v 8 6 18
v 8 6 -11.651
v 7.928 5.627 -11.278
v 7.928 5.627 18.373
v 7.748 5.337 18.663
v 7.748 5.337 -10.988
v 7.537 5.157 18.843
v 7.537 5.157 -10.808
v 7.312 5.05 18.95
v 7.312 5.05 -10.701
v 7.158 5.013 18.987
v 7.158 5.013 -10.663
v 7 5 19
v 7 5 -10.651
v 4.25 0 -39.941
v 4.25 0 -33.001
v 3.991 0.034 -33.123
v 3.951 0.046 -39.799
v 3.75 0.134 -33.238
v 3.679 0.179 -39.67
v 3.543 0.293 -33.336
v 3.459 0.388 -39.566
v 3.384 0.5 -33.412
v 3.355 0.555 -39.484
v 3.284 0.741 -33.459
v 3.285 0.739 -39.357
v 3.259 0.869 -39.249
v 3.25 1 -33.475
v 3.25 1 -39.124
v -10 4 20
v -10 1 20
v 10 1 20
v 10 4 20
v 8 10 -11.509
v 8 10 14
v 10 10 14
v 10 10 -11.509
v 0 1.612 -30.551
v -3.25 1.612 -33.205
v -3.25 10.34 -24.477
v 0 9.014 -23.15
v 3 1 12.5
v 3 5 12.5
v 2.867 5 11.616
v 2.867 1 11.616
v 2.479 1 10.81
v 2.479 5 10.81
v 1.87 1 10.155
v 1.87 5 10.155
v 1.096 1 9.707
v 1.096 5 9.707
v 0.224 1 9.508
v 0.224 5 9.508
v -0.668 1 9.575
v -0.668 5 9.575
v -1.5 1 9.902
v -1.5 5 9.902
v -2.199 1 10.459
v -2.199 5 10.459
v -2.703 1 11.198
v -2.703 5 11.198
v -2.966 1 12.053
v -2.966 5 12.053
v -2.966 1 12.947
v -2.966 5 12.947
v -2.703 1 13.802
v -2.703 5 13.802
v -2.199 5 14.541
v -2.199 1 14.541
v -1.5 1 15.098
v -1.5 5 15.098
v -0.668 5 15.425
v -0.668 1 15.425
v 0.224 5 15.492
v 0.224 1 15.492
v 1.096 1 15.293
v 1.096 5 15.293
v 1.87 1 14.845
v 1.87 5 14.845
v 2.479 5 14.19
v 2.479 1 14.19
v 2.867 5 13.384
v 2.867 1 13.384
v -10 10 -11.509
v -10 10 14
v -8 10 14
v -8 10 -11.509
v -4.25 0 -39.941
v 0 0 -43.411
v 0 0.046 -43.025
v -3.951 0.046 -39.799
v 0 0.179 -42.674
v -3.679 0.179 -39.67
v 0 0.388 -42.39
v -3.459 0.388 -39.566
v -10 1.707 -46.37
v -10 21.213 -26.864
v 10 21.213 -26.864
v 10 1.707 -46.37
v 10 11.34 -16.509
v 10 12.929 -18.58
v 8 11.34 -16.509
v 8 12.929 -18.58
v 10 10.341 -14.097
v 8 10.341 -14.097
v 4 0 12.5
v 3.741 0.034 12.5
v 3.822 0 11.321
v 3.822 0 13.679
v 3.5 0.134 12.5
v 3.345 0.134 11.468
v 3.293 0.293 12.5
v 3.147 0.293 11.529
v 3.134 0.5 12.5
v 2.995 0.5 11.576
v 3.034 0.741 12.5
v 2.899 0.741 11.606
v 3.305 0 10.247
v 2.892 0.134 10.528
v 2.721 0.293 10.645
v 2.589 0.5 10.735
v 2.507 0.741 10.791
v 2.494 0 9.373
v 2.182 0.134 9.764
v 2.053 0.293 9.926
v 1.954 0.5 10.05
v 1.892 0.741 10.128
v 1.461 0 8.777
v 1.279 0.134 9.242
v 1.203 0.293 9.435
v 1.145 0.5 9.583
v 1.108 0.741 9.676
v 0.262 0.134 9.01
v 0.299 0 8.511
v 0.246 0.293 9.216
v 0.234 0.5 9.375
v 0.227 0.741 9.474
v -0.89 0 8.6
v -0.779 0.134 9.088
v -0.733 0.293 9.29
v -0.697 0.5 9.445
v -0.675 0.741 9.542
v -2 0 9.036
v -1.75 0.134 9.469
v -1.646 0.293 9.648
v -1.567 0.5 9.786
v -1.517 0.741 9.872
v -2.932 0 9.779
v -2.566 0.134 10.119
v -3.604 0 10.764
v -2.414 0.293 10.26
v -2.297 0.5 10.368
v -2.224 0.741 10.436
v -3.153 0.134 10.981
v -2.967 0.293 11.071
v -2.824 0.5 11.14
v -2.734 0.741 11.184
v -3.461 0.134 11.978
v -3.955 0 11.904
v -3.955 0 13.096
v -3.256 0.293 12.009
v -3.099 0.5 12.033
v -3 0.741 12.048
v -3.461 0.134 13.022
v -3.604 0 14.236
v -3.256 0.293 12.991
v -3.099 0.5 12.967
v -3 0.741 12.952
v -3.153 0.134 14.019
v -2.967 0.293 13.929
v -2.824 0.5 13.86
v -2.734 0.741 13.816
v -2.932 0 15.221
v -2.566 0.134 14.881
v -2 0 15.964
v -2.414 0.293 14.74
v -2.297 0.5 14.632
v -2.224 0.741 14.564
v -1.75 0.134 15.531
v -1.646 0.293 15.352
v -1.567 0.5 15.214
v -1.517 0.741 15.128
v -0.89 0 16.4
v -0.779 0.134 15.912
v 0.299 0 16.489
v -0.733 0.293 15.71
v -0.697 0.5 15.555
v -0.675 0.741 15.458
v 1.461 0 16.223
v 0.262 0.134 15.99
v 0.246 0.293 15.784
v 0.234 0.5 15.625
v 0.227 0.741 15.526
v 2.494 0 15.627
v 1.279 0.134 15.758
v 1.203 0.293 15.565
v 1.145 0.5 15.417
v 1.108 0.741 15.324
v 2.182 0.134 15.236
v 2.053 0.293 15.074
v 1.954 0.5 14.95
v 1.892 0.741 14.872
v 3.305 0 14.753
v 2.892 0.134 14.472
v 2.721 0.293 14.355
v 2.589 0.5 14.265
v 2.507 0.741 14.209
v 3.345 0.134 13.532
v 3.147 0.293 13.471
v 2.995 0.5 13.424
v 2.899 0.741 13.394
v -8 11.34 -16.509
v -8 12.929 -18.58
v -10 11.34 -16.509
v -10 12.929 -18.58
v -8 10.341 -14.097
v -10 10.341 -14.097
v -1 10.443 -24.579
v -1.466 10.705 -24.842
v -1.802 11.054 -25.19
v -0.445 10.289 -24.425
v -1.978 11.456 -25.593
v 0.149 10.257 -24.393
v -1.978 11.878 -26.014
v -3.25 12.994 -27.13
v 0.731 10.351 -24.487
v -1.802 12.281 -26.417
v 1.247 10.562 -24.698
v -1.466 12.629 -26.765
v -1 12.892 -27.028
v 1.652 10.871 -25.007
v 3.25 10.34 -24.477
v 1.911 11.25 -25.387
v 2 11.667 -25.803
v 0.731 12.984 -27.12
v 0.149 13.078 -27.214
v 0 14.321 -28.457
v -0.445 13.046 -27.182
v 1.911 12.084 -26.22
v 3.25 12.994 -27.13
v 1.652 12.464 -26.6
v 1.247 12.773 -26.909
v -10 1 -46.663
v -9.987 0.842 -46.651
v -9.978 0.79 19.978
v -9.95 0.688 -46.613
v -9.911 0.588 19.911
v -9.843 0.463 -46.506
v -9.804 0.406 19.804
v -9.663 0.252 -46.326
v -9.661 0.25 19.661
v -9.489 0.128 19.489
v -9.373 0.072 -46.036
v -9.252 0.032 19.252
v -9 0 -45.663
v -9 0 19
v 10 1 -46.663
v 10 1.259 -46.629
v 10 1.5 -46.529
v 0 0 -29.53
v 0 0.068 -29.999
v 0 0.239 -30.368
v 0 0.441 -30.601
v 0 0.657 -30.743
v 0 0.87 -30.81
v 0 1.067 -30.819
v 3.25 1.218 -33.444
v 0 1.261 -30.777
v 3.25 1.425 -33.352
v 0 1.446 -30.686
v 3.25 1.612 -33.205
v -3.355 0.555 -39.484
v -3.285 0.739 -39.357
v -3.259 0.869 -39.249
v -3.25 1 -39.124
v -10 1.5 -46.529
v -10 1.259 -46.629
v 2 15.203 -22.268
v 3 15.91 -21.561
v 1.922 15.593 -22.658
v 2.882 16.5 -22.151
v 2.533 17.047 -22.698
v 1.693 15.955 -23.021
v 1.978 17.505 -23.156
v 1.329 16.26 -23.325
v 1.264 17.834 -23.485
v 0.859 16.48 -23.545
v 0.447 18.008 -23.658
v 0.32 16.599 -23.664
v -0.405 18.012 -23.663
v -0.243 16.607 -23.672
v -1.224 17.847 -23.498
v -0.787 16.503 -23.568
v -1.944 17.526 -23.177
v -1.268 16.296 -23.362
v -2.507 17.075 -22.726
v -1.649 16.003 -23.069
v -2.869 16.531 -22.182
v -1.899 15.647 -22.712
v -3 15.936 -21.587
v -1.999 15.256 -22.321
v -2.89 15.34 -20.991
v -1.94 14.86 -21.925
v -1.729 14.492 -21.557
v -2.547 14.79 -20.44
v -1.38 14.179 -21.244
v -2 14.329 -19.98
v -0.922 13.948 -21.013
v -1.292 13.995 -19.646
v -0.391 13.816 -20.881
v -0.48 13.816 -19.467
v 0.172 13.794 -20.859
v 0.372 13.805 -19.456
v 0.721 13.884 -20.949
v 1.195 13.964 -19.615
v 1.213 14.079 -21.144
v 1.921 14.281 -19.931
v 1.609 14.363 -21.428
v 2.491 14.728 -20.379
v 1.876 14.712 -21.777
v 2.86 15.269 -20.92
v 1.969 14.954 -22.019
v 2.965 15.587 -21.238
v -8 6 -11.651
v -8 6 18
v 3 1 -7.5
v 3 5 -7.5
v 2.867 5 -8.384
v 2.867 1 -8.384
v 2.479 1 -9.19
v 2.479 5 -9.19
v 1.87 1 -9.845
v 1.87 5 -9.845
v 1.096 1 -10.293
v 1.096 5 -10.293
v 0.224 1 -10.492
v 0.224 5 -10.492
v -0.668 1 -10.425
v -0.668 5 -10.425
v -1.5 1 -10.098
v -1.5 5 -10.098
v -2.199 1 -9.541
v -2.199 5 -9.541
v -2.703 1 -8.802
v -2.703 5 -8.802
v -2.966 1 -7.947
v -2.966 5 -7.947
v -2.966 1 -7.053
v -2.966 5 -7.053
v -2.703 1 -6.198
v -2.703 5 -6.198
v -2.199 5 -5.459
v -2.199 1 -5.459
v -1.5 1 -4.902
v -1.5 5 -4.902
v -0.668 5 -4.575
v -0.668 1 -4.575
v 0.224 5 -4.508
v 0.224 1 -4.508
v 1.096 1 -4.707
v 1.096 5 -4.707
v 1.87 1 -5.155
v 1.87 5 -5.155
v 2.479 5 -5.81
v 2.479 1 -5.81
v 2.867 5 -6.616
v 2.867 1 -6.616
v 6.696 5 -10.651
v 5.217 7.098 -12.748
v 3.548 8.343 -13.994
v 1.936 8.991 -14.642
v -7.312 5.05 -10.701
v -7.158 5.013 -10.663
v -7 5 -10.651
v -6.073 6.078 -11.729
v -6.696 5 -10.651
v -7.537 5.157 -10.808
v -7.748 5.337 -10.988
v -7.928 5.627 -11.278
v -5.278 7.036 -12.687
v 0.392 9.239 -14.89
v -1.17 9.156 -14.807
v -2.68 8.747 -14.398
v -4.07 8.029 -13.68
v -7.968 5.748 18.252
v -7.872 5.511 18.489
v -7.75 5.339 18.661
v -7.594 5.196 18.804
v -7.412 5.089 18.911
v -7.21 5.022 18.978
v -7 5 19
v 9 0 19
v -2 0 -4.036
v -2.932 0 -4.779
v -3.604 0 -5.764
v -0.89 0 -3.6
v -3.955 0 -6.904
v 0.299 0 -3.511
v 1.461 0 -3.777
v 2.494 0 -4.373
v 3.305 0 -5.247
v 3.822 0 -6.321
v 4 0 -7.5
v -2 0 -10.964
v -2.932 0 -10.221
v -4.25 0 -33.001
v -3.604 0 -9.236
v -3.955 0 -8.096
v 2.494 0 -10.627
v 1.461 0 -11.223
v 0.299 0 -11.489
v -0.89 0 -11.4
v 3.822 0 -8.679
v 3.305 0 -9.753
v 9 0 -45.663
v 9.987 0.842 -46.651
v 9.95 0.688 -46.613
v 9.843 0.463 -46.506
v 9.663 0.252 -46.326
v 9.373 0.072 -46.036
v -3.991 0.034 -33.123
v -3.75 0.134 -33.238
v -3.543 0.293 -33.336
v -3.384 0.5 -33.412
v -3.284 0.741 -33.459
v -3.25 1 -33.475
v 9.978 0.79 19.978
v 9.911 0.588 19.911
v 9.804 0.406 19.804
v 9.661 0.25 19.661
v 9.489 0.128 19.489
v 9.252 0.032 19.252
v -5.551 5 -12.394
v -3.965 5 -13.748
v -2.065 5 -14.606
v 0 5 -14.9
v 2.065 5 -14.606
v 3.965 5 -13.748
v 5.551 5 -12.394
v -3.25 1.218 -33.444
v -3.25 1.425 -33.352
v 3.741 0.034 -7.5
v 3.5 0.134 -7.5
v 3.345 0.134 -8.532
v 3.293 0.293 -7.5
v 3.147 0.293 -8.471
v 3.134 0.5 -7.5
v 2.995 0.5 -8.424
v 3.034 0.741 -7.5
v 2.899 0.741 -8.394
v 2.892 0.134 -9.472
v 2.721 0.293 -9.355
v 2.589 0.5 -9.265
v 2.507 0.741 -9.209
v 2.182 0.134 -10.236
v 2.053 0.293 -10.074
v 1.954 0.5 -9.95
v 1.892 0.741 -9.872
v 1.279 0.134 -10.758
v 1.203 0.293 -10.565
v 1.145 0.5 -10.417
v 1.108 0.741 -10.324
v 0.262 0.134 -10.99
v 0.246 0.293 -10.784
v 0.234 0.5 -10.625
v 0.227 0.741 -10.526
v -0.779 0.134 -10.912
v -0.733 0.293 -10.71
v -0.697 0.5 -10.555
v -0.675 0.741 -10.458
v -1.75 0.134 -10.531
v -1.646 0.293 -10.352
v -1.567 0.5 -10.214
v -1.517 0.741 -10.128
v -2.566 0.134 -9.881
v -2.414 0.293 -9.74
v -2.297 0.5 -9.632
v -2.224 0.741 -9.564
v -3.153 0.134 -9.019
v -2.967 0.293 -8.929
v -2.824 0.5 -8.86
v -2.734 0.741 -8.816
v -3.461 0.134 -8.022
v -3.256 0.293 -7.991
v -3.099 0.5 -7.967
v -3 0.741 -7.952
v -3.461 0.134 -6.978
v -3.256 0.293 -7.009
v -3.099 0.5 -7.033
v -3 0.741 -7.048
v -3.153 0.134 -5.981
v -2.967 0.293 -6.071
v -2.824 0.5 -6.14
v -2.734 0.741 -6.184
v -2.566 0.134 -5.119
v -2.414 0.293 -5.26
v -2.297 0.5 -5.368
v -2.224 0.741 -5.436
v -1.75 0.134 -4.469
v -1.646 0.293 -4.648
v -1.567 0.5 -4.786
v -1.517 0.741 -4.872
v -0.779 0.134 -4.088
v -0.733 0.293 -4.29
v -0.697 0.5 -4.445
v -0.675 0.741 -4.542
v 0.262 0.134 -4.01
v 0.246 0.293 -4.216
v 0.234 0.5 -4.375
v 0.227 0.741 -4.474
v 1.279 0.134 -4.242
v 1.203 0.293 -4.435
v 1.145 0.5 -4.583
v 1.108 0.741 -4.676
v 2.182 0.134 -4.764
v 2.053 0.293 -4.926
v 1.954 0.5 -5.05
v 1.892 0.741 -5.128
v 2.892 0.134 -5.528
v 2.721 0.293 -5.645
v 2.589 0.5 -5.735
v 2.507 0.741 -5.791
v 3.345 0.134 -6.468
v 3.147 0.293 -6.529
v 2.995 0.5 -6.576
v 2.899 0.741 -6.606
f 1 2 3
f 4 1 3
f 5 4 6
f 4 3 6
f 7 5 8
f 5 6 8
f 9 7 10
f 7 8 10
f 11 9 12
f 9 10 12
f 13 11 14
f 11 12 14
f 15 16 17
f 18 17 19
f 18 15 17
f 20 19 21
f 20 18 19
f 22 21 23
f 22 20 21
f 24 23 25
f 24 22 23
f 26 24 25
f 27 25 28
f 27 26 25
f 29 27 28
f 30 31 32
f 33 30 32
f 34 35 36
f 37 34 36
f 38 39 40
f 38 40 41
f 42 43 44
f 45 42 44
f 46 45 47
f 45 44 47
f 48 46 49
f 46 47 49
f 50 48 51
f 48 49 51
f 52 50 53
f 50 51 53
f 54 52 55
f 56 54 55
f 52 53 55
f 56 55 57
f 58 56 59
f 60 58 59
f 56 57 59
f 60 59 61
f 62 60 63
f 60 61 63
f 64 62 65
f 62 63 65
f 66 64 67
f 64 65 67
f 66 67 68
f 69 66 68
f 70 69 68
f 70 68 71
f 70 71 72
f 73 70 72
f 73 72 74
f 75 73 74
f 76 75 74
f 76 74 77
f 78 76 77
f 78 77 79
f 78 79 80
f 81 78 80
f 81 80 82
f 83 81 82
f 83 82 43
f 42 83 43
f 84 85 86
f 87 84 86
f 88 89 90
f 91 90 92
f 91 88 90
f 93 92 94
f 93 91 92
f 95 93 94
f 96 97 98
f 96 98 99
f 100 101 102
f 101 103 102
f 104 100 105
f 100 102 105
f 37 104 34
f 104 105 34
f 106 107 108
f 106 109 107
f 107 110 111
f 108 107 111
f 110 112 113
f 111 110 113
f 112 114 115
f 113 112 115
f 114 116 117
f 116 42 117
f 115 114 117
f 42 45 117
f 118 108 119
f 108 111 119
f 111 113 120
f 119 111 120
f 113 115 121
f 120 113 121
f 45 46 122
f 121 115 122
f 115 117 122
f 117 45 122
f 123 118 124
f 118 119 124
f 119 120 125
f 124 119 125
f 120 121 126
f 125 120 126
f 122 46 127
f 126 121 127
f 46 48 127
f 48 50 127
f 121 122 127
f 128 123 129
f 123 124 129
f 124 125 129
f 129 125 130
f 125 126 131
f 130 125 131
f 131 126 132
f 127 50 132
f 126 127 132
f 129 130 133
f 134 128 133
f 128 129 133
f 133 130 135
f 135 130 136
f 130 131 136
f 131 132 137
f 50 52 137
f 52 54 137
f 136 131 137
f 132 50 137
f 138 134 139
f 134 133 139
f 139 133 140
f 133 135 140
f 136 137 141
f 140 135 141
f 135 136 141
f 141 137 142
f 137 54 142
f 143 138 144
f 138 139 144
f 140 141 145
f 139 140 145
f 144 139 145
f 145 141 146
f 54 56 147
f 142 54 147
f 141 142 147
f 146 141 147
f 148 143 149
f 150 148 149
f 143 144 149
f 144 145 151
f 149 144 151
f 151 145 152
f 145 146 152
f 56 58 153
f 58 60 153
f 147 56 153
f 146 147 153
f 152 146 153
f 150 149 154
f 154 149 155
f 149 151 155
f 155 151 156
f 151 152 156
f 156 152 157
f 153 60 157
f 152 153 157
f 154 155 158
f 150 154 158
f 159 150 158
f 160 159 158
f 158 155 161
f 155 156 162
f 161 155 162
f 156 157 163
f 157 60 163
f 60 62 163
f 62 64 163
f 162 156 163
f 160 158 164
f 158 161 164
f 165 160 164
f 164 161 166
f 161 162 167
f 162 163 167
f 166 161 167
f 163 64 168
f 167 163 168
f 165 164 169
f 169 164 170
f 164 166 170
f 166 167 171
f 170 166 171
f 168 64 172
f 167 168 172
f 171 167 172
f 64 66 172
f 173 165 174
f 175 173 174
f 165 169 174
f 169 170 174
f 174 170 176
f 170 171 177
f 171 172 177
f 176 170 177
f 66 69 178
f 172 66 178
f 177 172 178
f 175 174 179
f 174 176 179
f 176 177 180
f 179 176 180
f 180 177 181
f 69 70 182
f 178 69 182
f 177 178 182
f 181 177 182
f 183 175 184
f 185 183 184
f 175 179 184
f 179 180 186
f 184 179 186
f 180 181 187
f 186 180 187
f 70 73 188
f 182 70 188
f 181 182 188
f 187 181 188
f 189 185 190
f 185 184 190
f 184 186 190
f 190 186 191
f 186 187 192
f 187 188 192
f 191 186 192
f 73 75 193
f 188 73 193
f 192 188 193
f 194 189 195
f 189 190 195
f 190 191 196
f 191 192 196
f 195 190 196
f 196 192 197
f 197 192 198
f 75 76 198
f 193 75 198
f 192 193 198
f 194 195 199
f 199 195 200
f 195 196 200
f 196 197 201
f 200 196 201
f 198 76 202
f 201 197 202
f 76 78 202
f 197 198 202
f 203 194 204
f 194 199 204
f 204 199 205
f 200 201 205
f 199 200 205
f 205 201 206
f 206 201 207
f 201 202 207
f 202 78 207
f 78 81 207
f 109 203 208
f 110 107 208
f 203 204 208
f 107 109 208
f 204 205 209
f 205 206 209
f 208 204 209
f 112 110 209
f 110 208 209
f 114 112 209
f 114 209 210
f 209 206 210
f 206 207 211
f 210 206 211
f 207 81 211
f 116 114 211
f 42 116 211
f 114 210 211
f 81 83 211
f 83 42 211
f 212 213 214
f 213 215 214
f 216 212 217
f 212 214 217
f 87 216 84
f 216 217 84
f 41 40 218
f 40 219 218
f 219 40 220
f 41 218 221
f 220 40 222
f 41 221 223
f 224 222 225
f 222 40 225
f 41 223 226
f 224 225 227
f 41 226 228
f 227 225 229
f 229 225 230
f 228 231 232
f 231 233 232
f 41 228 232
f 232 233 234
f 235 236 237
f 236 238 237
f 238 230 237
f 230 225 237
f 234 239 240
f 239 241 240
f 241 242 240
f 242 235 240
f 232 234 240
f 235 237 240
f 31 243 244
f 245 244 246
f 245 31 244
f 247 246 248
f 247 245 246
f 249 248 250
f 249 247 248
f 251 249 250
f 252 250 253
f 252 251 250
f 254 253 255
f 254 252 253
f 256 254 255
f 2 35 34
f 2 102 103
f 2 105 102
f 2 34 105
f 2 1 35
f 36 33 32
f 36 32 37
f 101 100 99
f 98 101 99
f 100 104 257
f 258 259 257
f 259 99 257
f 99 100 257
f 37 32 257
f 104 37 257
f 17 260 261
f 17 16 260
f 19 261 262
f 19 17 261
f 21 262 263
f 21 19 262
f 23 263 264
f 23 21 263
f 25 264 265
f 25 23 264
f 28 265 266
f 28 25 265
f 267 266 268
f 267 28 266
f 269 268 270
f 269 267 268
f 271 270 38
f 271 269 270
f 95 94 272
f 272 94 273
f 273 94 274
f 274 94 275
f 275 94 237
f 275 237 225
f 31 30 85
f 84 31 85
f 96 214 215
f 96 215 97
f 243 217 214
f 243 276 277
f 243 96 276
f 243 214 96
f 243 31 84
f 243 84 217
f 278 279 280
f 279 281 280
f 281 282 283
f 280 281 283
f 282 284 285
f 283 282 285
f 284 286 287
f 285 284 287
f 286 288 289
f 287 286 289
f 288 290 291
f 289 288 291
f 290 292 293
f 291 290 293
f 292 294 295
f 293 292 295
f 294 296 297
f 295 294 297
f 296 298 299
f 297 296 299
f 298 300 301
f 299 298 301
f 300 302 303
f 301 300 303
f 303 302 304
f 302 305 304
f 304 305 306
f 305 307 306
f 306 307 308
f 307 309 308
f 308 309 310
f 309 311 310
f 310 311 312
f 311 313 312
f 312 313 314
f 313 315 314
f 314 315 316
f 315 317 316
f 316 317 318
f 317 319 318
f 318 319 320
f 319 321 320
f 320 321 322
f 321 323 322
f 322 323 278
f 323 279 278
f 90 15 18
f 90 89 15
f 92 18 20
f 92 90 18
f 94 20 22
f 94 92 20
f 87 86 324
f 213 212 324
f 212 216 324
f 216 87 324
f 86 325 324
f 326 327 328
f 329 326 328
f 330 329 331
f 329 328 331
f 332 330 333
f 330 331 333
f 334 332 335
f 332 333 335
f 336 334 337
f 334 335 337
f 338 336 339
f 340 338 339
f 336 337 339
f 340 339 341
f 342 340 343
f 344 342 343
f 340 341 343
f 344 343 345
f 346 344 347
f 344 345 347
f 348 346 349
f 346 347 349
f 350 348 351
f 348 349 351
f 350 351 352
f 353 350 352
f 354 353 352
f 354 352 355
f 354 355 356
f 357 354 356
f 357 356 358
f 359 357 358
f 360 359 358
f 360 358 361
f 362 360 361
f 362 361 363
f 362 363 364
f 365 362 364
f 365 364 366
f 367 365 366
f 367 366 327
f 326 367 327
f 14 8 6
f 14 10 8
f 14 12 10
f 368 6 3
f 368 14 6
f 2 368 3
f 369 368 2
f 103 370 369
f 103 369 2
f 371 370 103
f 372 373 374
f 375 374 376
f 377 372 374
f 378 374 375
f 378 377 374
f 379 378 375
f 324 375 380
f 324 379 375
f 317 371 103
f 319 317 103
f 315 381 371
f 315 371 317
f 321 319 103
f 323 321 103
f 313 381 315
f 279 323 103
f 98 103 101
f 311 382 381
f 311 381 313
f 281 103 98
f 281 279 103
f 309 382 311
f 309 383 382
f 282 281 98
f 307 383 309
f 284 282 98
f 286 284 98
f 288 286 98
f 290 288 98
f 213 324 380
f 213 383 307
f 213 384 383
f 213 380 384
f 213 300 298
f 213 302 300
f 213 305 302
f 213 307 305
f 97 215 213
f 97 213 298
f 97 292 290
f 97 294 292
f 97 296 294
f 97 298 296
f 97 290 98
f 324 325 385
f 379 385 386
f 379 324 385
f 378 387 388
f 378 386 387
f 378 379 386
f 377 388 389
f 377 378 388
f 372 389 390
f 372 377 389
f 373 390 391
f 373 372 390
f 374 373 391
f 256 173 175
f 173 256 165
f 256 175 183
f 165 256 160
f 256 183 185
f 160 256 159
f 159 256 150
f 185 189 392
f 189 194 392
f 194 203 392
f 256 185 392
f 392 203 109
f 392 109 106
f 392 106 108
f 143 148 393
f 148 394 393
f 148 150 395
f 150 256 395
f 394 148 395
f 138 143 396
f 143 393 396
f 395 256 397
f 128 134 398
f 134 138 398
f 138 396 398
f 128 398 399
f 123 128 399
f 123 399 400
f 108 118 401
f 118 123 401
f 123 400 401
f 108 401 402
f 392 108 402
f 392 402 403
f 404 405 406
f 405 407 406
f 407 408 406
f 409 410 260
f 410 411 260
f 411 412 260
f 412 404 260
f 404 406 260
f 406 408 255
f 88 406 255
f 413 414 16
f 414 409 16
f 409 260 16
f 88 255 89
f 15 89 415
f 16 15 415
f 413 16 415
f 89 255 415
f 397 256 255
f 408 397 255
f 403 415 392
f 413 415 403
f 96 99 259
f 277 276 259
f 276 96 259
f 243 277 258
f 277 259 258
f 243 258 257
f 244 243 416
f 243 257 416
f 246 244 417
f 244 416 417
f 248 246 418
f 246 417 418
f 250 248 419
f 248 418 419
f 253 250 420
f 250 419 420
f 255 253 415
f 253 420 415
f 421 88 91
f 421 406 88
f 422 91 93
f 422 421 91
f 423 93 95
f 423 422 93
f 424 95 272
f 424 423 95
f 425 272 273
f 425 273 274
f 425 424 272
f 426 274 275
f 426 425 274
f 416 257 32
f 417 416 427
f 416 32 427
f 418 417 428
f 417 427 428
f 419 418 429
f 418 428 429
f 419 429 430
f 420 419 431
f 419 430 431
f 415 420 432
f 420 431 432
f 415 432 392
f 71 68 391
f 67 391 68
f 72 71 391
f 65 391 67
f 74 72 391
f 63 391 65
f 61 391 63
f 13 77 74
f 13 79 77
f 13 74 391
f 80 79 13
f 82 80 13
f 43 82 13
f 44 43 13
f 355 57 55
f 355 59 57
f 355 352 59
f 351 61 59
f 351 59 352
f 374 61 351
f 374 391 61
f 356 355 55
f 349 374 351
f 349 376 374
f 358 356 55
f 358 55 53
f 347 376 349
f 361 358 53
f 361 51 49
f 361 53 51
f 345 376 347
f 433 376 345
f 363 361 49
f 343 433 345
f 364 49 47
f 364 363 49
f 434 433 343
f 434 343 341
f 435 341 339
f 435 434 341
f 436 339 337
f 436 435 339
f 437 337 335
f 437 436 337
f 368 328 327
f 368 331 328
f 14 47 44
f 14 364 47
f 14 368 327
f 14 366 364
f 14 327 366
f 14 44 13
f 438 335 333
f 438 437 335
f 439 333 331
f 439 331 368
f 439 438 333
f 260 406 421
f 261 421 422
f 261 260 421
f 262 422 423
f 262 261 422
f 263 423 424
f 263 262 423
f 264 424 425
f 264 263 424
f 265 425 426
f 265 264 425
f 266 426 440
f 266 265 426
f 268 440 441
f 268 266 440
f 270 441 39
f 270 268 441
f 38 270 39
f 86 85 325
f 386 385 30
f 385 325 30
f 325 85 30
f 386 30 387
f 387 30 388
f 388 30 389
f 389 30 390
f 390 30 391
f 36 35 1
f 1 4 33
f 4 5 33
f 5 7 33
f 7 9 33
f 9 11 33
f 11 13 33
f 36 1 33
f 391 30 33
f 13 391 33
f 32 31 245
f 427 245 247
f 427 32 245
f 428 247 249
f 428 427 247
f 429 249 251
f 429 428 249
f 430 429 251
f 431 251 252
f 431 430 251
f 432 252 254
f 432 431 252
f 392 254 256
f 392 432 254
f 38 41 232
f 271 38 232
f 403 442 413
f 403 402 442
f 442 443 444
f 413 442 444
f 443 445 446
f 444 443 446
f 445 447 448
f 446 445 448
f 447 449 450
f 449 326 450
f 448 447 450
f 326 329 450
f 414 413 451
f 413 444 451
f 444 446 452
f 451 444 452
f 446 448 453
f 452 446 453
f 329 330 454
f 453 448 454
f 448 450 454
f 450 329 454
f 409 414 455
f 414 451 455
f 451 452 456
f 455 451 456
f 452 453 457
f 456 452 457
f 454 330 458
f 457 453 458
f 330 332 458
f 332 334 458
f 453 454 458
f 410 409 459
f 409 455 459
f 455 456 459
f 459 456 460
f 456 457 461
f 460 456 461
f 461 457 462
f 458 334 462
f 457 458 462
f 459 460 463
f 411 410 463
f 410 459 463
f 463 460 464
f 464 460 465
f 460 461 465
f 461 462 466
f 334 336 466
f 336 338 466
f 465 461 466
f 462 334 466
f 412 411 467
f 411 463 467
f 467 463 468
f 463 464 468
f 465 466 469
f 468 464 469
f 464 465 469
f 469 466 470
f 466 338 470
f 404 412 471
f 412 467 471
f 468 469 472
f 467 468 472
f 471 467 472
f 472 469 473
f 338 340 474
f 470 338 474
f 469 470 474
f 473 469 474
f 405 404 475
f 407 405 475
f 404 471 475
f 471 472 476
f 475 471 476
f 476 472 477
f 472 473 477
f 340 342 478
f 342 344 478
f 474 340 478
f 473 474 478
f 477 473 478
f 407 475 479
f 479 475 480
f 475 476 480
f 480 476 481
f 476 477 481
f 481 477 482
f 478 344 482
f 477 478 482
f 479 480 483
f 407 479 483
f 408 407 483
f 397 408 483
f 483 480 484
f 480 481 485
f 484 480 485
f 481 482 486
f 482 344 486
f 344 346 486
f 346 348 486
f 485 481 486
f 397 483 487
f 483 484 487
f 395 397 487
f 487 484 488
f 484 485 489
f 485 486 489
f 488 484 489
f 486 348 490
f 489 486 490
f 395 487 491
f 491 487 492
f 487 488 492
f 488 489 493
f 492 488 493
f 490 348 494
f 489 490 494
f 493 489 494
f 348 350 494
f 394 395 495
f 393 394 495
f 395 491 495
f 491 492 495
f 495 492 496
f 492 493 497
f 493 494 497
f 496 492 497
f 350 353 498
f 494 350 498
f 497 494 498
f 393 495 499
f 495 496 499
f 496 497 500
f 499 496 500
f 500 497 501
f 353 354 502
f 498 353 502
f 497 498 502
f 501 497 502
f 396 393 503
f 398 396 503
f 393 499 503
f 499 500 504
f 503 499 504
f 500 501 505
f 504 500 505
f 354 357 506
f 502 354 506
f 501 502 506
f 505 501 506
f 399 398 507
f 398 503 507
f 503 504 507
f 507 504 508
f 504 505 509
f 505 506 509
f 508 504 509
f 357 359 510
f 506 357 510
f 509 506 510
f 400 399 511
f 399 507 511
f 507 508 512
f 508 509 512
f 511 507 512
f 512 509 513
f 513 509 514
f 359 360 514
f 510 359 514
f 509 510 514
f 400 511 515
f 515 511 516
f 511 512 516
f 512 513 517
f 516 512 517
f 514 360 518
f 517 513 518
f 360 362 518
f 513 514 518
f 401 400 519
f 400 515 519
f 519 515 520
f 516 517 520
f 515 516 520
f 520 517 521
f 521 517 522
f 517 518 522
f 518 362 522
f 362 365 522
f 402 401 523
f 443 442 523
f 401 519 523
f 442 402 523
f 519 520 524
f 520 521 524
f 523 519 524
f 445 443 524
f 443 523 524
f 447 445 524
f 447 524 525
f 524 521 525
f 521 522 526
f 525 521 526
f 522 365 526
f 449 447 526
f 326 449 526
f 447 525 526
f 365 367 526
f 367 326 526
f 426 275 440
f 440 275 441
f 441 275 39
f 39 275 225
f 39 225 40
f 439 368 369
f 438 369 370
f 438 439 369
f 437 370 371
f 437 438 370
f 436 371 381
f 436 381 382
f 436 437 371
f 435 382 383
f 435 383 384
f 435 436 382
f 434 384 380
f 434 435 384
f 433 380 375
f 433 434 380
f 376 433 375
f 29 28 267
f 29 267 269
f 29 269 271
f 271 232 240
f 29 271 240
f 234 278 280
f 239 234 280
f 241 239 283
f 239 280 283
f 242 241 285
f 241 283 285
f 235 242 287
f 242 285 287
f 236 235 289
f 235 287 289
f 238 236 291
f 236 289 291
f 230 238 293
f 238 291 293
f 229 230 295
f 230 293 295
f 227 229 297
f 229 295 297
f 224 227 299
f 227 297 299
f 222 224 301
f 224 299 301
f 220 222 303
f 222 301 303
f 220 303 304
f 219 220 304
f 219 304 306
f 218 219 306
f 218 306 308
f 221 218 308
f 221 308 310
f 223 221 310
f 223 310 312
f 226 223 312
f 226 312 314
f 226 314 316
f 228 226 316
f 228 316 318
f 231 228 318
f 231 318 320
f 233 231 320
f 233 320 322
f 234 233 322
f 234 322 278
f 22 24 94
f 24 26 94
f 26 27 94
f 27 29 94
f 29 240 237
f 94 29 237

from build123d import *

# Parameters (mm, degrees)
SKETCH1_W           = 20
SKETCH1_H           = 40
BOSS_EXTRUDE1_DEPTH = 5
BOSS_EXTRUDE2_DEPTH = 20
SKETCH3_R           = 3
CUT_EXTRUDE1_DEPTH  = 15
LPATTERN1_COUNT     = 2
LPATTERN1_PITCH     = 20
SKETCH4_R           = 7.4
CUT_EXTRUDE2_DEPTH  = 15
SKETCH5_R           = 2
CUT_EXTRUDE3_DEPTH  = 50
CUT_EXTRUDE4_START  = -6
CUT_EXTRUDE4_DEPTH  = 40
CHAMFER1_SIZE       = 1
FILLET2_R           = 1
SKETCH7_W           = 2
SKETCH7_H           = 45.940909218
BOSS_EXTRUDE3_DEPTH = 5
LPATTERN2_COUNT     = 2
LPATTERN2_PITCH     = 18
FILLET3_R           = 1
CHAMFER2_SIZE       = 6
FILLET4_R           = 10


with BuildPart() as part:
    # Sketch1 → Boss-Extrude1 (new body)
    with BuildSketch(Plane(origin=(0, 0, 0), x_dir=(1, 0, 0), z_dir=(0, 1, 0))):
        Rectangle(SKETCH1_W, SKETCH1_H)
    extrude(amount=BOSS_EXTRUDE1_DEPTH)

    # Sketch2 → Boss-Extrude2 (add)
    with BuildSketch(Plane.ZY.offset(10)):
        Polygon((-5.650883497, 0), (-26.864086932, 21.213203436), (-48.077290368, 0), align=None)
    extrude(amount=-BOSS_EXTRUDE2_DEPTH)

    # Sketch3 → Cut-Extrude1 (cut)
    with BuildSketch(Plane(origin=(0, 5, 0), x_dir=(1, 0, 0), z_dir=(0, 1, 0))):
        with Locations((0, -12.5)):
            Circle(SKETCH3_R)
    cut_extrude1 = extrude(amount=-CUT_EXTRUDE1_DEPTH, mode=Mode.SUBTRACT)

    # LPattern1: Cut-Extrude1 ×2
    with Locations(*[(0, 0, -i * LPATTERN1_PITCH) for i in range(1, LPATTERN1_COUNT)]):
        add(cut_extrude1, mode=Mode.SUBTRACT)

    # Sketch4 → Cut-Extrude2 (cut)
    with BuildSketch(Plane(origin=(0, 5, 0), x_dir=(1, 0, 0), z_dir=(0, 1, 0))):
        with Locations((0, 7.5)):
            Circle(SKETCH4_R)
    extrude(amount=CUT_EXTRUDE2_DEPTH, mode=Mode.SUBTRACT)

    # Sketch5 → Cut-Extrude3 (cut)
    with BuildSketch(Plane(origin=(0, -2.825441748, -2.825441748), x_dir=(1, 0, 0), z_dir=(0, 0.707106781, 0.707106781))):
        with Locations((0, 26.49577804)):
            Circle(SKETCH5_R)
    extrude(amount=-CUT_EXTRUDE3_DEPTH, mode=Mode.SUBTRACT)

    # Sketch6 → Cut-Extrude4 (cut)
    with BuildSketch(Plane(origin=(0, -2.825441748, -2.825441748), x_dir=(1, 0, 0), z_dir=(0, 0.707106781, 0.707106781)).offset(CUT_EXTRUDE4_START)):
        Polygon((0, 30.24855479), (-3.25, 28.372166415), (-3.25, 24.619389665), (0, 22.743001291), (3.25, 24.619389665), (3.25, 28.372166415), align=None)
    extrude(amount=-CUT_EXTRUDE4_DEPTH, mode=Mode.SUBTRACT)

    # Chamfer1
    chamfer1_edges = [part.edges().sort_by_distance(p)[0] for p in [
        (-2, 15.909902577, -21.560786074),
    ]]
    chamfer(chamfer1_edges, length=CHAMFER1_SIZE)

    # Fillet2
    fillet2_edges = [part.edges().sort_by_distance(p)[0] for p in [
        (0, 0, -48.077290368),
        (-3, 0, 12.5),
        (-3, 0, -7.5),
        (0, 0, 20),
        (-10, 0, -14.038645184),
        (-1.625, 0, -41.451109482),
        (-3.25, 0, -37.47068865),
        (-1.625, 0, -33.490267818),
        (1.625, 0, -33.490267818),
        (3.25, 0, -37.47068865),
        (1.625, 0, -41.451109482),
        (10, 0, -14.038645184),
    ]]
    fillet(fillet2_edges, radius=FILLET2_R)

    # Sketch7 → Boss-Extrude3 (add)
    with BuildSketch(Plane(origin=(0, 5, 0), x_dir=(1, 0, 0), z_dir=(0, 1, 0))):
        with Locations((-9, 2.970454609)):
            Rectangle(SKETCH7_W, SKETCH7_H)
    boss_extrude3 = extrude(amount=BOSS_EXTRUDE3_DEPTH)

    # LPattern2: Boss-Extrude3 ×2
    with Locations(*[(i * LPATTERN2_PITCH, 0, 0) for i in range(1, LPATTERN2_COUNT)]):
        add(boss_extrude3)

    # Fillet3
    fillet3_edges = [part.edges().sort_by_distance(p)[0] for p in [
        (-8, 5, 4.674558252),
        (8, 5, 4.674558252),
    ]]
    fillet(fillet3_edges, radius=FILLET3_R)

    # Chamfer2
    chamfer2_edges = [part.edges().sort_by_distance(p)[0] for p in [
        (9, 10, 20),
    ]]
    chamfer(chamfer2_edges, length=CHAMFER2_SIZE)

    # Fillet4
    fillet4_edges = [part.edges().sort_by_distance(p)[0] for p in [
        (-9, 10, -15.650883497),
        (9, 10, -15.650883497),
    ]]
    fillet(fillet4_edges, radius=FILLET4_R)


solid = part.part
